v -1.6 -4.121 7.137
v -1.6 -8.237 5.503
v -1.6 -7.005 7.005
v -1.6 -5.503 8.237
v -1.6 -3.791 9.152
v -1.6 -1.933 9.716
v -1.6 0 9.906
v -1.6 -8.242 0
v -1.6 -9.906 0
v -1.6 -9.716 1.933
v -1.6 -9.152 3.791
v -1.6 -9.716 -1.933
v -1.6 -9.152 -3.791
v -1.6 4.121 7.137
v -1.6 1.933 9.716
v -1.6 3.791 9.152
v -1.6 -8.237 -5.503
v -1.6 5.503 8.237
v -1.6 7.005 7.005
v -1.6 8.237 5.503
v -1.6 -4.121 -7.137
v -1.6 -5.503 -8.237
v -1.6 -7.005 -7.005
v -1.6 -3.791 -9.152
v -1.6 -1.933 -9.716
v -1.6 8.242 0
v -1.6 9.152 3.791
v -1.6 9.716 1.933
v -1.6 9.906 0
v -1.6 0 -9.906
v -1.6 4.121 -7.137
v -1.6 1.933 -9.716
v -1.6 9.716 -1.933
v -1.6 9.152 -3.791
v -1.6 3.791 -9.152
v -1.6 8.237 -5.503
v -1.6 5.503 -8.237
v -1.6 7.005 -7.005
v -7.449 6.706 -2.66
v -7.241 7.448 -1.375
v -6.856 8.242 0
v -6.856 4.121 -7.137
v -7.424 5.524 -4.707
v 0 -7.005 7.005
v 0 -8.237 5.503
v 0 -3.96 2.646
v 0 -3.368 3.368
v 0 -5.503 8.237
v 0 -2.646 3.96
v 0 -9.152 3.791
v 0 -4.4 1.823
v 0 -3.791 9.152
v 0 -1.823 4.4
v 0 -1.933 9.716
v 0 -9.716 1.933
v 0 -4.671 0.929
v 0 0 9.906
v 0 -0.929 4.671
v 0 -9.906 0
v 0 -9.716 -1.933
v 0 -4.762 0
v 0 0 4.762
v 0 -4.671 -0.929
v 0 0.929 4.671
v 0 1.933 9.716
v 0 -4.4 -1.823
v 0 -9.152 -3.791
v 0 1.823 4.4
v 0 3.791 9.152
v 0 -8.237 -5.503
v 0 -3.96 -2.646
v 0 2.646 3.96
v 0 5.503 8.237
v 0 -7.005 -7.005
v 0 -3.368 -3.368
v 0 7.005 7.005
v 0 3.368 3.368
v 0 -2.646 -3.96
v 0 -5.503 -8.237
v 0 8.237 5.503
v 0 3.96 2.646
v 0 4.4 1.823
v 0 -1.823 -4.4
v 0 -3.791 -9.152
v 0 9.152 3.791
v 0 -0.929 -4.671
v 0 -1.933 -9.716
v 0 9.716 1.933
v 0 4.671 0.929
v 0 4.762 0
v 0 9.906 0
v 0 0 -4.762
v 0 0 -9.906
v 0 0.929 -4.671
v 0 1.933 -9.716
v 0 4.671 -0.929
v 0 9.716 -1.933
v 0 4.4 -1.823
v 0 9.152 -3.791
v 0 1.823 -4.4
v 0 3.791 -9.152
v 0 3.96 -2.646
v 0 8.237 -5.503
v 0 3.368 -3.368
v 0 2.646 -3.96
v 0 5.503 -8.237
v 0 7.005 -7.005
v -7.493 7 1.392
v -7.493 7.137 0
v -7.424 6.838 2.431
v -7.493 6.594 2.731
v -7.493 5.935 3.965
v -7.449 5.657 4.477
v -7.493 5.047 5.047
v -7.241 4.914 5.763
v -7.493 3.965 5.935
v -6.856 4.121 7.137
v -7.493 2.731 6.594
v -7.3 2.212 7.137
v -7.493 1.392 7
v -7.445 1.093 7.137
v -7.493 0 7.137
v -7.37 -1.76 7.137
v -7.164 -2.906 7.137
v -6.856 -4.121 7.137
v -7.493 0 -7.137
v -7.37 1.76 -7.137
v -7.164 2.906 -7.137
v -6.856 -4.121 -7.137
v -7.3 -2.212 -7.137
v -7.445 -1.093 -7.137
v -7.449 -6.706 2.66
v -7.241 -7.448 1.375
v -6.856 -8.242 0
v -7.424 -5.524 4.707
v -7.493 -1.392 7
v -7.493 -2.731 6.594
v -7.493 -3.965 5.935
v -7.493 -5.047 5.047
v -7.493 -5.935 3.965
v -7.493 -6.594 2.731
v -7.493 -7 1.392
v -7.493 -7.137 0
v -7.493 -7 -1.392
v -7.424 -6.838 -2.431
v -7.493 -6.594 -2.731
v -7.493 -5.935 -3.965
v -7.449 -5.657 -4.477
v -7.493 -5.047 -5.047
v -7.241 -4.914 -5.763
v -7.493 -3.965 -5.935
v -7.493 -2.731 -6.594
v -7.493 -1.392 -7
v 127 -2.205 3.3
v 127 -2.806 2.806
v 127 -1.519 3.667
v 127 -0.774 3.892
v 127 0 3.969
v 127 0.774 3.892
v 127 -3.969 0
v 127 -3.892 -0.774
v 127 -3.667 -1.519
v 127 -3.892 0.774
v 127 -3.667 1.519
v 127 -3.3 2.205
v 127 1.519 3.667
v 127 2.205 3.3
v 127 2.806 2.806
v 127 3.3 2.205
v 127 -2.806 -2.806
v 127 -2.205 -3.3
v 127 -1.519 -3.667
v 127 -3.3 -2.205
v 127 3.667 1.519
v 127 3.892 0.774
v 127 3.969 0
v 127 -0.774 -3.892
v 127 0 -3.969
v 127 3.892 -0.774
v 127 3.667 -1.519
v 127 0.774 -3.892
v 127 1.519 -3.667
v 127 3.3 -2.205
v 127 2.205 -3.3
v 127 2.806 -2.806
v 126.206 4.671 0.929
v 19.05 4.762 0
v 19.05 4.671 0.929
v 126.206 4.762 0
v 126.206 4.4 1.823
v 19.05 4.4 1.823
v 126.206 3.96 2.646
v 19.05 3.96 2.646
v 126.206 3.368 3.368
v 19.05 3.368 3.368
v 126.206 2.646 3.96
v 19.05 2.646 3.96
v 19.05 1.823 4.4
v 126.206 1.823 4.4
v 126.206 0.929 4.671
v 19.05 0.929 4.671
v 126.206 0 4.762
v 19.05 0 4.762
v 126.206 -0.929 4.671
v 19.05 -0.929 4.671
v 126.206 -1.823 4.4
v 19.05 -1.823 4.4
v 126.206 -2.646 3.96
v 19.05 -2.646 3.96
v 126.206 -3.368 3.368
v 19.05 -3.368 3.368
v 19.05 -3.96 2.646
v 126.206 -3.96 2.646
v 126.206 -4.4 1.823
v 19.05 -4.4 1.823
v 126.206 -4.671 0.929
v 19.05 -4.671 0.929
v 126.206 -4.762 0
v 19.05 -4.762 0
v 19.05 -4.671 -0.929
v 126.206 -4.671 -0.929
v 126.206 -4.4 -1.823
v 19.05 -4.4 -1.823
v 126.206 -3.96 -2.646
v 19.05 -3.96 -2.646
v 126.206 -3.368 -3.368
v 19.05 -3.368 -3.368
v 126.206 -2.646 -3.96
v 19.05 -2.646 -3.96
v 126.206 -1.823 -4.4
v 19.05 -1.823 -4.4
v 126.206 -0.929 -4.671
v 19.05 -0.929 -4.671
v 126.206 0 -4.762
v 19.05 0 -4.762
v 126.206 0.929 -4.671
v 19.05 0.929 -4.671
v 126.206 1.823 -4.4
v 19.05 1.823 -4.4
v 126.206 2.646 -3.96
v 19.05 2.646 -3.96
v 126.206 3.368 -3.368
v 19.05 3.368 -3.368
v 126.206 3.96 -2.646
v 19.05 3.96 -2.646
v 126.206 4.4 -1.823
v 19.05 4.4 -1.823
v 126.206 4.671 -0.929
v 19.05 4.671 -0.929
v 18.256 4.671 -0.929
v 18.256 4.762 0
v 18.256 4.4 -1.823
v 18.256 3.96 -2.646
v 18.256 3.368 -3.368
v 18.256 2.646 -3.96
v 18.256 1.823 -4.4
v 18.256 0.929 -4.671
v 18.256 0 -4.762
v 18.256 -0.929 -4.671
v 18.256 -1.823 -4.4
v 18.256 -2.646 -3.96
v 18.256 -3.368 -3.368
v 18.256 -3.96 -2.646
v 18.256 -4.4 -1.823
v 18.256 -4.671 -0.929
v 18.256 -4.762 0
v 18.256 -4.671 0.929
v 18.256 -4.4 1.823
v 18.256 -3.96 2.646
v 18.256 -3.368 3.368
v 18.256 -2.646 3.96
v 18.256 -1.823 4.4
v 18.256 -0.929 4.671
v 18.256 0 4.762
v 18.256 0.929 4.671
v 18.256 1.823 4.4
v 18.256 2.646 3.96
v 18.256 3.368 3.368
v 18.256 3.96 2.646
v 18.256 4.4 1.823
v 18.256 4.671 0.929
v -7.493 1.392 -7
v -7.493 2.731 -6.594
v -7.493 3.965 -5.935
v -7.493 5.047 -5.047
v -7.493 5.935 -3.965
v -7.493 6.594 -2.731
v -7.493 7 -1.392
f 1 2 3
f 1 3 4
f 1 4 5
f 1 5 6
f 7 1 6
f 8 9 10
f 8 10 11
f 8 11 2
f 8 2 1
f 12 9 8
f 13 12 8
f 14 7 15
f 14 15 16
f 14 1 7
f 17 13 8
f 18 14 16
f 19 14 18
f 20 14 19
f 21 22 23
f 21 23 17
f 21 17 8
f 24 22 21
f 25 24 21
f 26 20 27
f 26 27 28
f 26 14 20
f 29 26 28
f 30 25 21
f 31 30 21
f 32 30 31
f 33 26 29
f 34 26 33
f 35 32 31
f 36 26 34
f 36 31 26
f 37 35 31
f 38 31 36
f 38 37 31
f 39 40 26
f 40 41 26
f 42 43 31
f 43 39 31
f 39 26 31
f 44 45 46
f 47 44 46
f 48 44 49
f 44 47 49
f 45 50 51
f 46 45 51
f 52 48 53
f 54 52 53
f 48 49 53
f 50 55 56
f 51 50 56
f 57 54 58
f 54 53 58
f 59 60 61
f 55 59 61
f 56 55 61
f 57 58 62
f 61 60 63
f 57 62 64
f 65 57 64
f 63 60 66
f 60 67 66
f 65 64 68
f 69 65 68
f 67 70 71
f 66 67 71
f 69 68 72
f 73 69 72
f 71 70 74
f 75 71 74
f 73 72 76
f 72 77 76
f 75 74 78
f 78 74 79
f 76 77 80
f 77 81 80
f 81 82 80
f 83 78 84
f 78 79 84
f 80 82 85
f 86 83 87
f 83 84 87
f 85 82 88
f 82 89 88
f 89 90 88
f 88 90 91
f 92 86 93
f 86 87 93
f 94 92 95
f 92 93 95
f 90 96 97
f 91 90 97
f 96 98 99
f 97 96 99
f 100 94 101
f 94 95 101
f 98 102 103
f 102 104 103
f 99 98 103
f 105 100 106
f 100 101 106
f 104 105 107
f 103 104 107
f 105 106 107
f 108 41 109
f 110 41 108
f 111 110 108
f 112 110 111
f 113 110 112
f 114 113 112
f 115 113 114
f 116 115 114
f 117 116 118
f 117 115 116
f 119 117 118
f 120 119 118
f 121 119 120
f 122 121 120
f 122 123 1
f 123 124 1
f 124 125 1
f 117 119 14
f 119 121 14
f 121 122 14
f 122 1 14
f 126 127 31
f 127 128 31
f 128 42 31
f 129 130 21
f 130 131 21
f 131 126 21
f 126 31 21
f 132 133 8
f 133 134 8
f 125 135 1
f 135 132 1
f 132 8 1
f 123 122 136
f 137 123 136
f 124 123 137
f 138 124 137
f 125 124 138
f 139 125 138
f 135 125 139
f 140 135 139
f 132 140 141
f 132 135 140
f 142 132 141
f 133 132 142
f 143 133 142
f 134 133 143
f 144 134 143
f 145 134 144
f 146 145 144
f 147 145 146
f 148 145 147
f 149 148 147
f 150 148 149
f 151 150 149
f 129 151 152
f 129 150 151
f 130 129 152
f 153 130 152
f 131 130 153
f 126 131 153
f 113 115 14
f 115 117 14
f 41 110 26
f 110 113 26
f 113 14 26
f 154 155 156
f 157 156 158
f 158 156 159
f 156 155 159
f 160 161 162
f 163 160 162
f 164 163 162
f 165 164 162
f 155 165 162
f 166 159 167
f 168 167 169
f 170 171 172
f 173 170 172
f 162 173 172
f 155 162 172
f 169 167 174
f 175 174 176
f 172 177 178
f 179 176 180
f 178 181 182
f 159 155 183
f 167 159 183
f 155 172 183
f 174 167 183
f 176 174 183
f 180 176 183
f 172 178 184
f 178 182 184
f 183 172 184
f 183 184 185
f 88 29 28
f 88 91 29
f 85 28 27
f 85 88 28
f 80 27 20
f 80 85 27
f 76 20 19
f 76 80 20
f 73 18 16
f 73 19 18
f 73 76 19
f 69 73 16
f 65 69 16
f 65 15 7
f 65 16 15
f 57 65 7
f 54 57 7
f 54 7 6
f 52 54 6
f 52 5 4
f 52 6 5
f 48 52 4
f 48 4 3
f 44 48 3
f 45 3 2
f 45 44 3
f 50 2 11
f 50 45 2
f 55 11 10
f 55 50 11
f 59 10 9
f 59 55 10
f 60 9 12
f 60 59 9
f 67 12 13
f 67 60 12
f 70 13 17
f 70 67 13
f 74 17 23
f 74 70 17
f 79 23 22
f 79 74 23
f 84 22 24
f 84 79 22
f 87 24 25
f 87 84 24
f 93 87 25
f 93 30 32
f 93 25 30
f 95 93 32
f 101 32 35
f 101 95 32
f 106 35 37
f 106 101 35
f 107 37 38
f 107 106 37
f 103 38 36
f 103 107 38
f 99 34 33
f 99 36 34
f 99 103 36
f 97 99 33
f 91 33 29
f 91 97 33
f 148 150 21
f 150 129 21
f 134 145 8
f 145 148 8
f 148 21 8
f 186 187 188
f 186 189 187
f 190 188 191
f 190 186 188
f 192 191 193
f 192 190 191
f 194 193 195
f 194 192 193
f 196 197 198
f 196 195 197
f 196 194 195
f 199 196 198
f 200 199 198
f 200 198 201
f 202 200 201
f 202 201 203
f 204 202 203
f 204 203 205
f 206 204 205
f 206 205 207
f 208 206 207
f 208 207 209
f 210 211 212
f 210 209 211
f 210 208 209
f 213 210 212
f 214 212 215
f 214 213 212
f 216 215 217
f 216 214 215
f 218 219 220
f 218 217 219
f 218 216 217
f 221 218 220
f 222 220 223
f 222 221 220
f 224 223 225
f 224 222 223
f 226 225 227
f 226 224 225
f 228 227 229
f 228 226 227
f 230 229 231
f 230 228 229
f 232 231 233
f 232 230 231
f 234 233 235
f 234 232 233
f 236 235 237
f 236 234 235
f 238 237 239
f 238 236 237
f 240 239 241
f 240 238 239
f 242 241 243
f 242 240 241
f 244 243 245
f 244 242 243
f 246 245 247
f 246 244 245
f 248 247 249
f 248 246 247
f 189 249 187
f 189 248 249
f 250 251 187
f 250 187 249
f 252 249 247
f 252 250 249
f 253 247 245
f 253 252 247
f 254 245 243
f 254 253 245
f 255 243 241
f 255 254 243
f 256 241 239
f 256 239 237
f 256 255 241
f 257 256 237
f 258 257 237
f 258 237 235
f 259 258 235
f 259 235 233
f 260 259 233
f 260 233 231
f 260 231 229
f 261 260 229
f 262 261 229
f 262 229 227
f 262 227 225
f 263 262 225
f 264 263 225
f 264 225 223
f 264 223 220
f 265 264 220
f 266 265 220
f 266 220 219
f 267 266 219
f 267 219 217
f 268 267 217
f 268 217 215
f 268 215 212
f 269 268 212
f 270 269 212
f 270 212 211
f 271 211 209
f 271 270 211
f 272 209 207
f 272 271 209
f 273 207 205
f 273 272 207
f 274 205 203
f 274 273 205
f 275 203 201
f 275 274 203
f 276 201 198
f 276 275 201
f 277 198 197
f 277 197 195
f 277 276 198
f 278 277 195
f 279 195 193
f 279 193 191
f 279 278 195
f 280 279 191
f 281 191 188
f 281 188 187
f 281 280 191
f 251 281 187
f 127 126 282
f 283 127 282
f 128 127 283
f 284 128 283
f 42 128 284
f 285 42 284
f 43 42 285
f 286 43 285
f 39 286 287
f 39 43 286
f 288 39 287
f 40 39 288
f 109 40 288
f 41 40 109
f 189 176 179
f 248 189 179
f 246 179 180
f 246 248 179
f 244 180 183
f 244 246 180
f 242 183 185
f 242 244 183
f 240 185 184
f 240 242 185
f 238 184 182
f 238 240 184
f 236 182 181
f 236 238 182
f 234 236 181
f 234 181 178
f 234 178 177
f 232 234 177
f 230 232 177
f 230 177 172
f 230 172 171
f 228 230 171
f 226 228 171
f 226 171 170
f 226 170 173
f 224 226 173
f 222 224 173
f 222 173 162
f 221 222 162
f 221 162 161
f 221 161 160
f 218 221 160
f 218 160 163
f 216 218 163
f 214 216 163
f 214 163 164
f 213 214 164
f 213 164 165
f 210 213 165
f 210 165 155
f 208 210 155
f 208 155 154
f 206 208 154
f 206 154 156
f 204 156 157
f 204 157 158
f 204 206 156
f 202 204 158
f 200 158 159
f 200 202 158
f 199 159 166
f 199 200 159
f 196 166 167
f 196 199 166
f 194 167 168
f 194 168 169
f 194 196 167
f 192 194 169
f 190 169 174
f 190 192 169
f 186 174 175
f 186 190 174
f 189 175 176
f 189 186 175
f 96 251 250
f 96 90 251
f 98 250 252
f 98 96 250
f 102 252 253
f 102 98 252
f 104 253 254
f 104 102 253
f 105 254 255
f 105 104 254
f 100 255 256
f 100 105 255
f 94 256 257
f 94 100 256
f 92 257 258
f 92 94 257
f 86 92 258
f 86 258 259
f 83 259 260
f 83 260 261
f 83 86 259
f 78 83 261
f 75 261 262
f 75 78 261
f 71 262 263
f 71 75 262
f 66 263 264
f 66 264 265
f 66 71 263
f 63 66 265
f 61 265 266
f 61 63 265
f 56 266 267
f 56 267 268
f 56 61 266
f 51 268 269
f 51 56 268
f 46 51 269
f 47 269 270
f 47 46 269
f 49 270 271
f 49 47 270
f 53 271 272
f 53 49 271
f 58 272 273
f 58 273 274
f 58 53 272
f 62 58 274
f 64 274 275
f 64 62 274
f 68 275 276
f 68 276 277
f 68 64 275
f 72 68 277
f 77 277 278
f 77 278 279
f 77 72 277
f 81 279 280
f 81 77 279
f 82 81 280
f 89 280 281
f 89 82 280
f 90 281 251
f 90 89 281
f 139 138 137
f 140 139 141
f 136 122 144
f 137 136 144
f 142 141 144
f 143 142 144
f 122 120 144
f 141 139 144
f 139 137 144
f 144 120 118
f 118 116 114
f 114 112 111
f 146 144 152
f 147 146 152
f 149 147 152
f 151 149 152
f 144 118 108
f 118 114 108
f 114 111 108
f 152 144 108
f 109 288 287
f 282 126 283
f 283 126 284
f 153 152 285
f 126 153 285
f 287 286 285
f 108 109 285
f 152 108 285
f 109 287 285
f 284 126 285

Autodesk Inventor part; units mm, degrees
ref_plane "YZ Plane" through (0, 0, 0) normal (1, 0, 0) x (0, 1, 0)
ref_plane "XZ Plane" through (0, 0, 0) normal (0, 1, 0) x (-1, 0, 0)
sketch "Sketch1" plane through (0, 0, 0) normal (0, 0, 1) x (1, 0, 0)
  line L0 (0, 9.906) -> (0, 4.7625)
  line L1 (19.05, 4.7625) -> (127, 4.7625)
  line L2 (127, 4.7625) -> (127, 0)
  line L3 (127, 0) -> (-1.6002, 0)
  line L4 (0, -1.9812) -> (0, 11.8872) projected
  line L5 (-27.3202, 0) -> (152.72, 0) projected
  line L6 (-1.6002, 0) -> (-1.6002, 9.906)
  line L7 (-1.6002, 9.906) -> (0, 9.906)
  line L8 (19.05, 4.7625) -> (18.2562, 4.7625)
  line L9 (18.2562, 4.7625) -> (0, 4.7625)
  dimension "d0" = 127
  dimension "d1" = 107.95
  dimension "d2" = 9.525
  dimension "d8" = 1.6002
  dimension "d9" = 19.812
  dimension "d15" = 9.525
  dimension "d16" = 0.7937
revolve "Body" add sketch "Sketch1" angle 360 about axis through (127, 0, 0) along (-1, 0, 0)
sketch "Sketch2" plane through (0, 0, 0) normal (1, 0, 0) x (0, 0, -1)
  circle A0 centre (0, 0) radius 9.906 projected
  line L0 (0, 8.2416) -> (7.1374, 4.1208)
  line L1 (7.1374, 4.1208) -> (7.1374, -4.1208)
  line L2 (7.1374, -4.1208) -> (0, -8.2416)
  line L3 (0, -8.2416) -> (-7.1374, -4.1208)
  line L4 (-7.1374, -4.1208) -> (-7.1374, 4.1208)
  line L5 (-7.1374, 4.1208) -> (0, 8.2416)
  circle A1 centre (0, 0) radius 9.906 projected
  dimension "d10" = 14.2748
extrude "Head" add sketch "Sketch2" against normal blind 7.493 contours L0 L1 L2 L3 L4 L5
sketch "Sketch3" plane through (0, 0, 0) normal (0, 0, 1) x (1, 0, 0)
  line L0 (-7.493, 7.1374) -> (-7.493, 8.2416)
  line L1 (-7.493, 8.2416) -> (-6.8555, 8.2416)
  line L2 (-6.8555, 8.2416) -> (-7.493, 7.1374)
  line L3 (-2.8347, 8.2416) -> (-7.493, 8.2416)
  line L4 (-7.493, 8.2416) -> (-7.493, 5.9322)
  line L5 (-1.6002, 8.2416) -> (-7.493, 8.2416) projected
  line L6 (-7.493, 8.2416) -> (-7.493, 4.1208) projected
  line L7 (-8.6716, 0) -> (-0.4216, 0) projected
  dimension "d5" = 30
  dimension "d18" = 14.2748
revolve "Chamfer1" cut sketch "Sketch3" angle 360 about axis through (-10, 0, 0) along (1, 0, 0)
thread "Thread" size "3/8-16 UNC" class "2A" standard "ANSI Unified Screw Threads" length 107.95
chamfer "Chamfer2" distance 0.7938 distance2 0.7938 1 edges at (127, -4.7625, 0) measured on face at (127, -1.1883, 1.0527)
ref_plane "Work Plane1" through (3.5, 0, 0) normal (0, 0, 1) x (1, 0, 0)
equation "\"d0\" = NLG"
equation "\"d1\" = GEL"
equation "\"d2\" = GD"
equation "\"d8\" = PHH"
equation "\"d9\" = LADI"
equation "\"d15\" = BDM"
equation "\"d16\" = GAL"
equation "\"d10\" = SW"
equation "\"d3\" = KOH"
equation "\"d13\" = GEL"
equation "\"d6\" = -0.5 * SPD + 0.5 * GD"
equation "\"d7\" = -0.5 * SPD + 0.5 * GD"
equation "\"d5\" = ANG1"
equation "\"d18\" = SW0"
equation "\"NLG\" = 127"
equation "\"GD\" = NND"
equation "\"BDM\" = NND"
equation "\"KOH\" = 7.493"
equation "\"GEL\" = 107.95"
equation "\"LADI\" = 19.812"
equation "\"SW\" = 14.2748"
equation "\"PHH\" = 1.6002"
equation "\"SW0\" = 14.2748"
equation "\"SPD\" = GD1"
equation "\"ANG1\" = 30deg"
equation "\"GAL\" = 0.79375"
equation "\"GUL\" = GAL"
equation "\"GD1\" = 7.9375"
equation "\"THREADDIA\" = 9.525"
equation "\"SDH\" = SW"
equation "\"TOA\" = 30deg"
equation "\"RR\" = 0.09525"
equation "\"NND\" = 9.525"
equation "\"SD\" = 0"
equation "\"SD2\" = NND"
equation "\"E0\" = 16.48739"
properties part number "ANSI B18.6.3 - 3/8-16 UNC x 5, PHWHMSI" material "Steel, Mild"
